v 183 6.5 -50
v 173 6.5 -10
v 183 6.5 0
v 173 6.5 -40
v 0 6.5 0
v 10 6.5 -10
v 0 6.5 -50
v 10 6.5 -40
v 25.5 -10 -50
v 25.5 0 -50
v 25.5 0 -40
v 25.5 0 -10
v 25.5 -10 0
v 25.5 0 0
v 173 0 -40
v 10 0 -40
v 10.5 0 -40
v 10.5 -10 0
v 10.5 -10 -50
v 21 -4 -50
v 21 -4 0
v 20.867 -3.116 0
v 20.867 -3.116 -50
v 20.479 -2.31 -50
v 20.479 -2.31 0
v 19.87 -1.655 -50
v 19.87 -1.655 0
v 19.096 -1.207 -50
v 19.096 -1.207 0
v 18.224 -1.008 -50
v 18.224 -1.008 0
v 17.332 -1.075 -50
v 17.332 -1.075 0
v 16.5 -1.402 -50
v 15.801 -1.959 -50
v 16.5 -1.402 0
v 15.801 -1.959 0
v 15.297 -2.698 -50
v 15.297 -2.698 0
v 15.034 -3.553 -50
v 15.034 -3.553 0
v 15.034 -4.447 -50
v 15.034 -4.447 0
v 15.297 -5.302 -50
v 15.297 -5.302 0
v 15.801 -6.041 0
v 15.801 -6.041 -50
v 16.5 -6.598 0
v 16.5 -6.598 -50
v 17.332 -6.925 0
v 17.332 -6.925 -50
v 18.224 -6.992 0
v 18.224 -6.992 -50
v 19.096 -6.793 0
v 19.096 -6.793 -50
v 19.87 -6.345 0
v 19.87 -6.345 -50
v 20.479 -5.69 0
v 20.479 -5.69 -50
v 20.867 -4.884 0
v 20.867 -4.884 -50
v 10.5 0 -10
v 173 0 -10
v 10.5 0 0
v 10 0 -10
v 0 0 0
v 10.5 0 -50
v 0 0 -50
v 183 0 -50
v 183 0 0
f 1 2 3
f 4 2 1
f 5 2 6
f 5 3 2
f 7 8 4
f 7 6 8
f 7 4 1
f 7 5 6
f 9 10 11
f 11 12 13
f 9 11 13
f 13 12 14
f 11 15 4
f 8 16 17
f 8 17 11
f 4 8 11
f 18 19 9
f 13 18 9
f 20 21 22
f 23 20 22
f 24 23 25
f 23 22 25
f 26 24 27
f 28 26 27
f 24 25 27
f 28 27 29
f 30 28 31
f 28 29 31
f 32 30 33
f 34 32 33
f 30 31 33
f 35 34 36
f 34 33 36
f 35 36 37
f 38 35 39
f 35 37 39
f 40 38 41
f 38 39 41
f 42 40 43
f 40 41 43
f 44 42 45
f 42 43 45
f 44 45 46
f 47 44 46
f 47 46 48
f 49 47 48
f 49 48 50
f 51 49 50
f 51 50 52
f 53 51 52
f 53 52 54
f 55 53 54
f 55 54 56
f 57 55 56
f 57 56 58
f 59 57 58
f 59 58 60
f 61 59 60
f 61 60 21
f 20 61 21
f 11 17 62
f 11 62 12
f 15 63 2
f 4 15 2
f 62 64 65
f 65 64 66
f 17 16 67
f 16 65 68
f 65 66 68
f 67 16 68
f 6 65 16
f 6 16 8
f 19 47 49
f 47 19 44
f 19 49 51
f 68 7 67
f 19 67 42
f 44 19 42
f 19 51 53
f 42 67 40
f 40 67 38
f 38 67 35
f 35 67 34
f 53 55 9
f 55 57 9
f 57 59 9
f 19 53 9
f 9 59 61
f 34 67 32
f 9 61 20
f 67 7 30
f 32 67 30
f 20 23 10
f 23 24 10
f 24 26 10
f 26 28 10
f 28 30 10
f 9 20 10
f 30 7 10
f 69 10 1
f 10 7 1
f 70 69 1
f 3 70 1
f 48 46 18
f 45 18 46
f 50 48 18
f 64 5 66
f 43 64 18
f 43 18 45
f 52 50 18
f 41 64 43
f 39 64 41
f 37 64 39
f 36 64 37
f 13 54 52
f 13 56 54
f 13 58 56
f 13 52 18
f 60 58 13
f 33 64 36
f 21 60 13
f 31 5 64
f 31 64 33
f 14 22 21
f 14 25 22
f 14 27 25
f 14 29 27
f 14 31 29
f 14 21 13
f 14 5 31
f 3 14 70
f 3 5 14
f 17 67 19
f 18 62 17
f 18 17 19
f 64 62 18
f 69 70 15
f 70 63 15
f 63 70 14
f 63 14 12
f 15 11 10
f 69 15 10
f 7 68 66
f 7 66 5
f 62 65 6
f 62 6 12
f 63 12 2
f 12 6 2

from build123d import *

# Parameters (mm, degrees)
SKETCH_1_W          = 183
SKETCH_1_H          = 6.5
EXTRUDE_1_DEPTH     = 10
SKETCH_2_W          = 10
SKETCH_2_H          = 6.5
EXTRUDE_2_DEPTH     = 40
EXTRUDE_3_REACH     = 182.198
SKETCH_3_W          = 10
SKETCH_3_H          = 6.5
SKETCH_7_W          = 15
SKETCH_7_H          = 50
EXTRUDE_5_DEPTH     = 10
CUT_EXTRUDE_2_REACH = 191.971
SKETCH_8_R          = 3


with BuildPart() as part:
    # 草图1 → 凸台-拉伸1 (new body)
    with BuildSketch(Plane.XY):
        with Locations((91.5, 3.25)):
            Rectangle(SKETCH_1_W, SKETCH_1_H)
    extrude(amount=-EXTRUDE_1_DEPTH)

    # 草图2 → 凸台-拉伸2 (add)
    with BuildSketch(Plane(origin=(0, 0, -10), x_dir=(-1, 0, 0), z_dir=(0, 0, -1))):
        with Locations((-178, 3.25)):
            Rectangle(SKETCH_2_W, SKETCH_2_H)
        with Locations((-5, 3.25)):
            Rectangle(SKETCH_2_W, SKETCH_2_H)
    extrude(amount=EXTRUDE_2_DEPTH)

    # 草图3 → 凸台-拉伸3 (add, up to next)
    with BuildSketch(Plane(origin=(10, 0, 0), x_dir=(0, 0, -1), z_dir=(1, 0, 0)), mode=Mode.PRIVATE) as extrude_3_sk1:
        with Locations((45, 3.25)):
            Rectangle(SKETCH_3_W, SKETCH_3_H)
    extrude_3_tool1 = extrude(extrude_3_sk1.sketch, amount=EXTRUDE_3_REACH, mode=Mode.PRIVATE) - part.part
    add(extrude_3_tool1.solids().sort_by_distance((10, 3.25, -45))[0])

    # 草图7 → 凸台-拉伸5 (add)
    with BuildSketch(Plane.XZ):
        with Locations((18, -25)):
            Rectangle(SKETCH_7_W, SKETCH_7_H)
    extrude(amount=EXTRUDE_5_DEPTH)

    # 草图8 → 切除-拉伸2 (cut, up to next)
    with BuildSketch(Plane.XY, mode=Mode.PRIVATE) as cut_extrude_2_sk1:
        with Locations((18, -4)):
            Circle(SKETCH_8_R)
    cut_extrude_2_tool1 = extrude(cut_extrude_2_sk1.sketch, amount=-CUT_EXTRUDE_2_REACH, mode=Mode.PRIVATE) & part.part
    add(cut_extrude_2_tool1.solids().sort_by_distance((18, -4, 0))[0], mode=Mode.SUBTRACT)


solid = part.part
